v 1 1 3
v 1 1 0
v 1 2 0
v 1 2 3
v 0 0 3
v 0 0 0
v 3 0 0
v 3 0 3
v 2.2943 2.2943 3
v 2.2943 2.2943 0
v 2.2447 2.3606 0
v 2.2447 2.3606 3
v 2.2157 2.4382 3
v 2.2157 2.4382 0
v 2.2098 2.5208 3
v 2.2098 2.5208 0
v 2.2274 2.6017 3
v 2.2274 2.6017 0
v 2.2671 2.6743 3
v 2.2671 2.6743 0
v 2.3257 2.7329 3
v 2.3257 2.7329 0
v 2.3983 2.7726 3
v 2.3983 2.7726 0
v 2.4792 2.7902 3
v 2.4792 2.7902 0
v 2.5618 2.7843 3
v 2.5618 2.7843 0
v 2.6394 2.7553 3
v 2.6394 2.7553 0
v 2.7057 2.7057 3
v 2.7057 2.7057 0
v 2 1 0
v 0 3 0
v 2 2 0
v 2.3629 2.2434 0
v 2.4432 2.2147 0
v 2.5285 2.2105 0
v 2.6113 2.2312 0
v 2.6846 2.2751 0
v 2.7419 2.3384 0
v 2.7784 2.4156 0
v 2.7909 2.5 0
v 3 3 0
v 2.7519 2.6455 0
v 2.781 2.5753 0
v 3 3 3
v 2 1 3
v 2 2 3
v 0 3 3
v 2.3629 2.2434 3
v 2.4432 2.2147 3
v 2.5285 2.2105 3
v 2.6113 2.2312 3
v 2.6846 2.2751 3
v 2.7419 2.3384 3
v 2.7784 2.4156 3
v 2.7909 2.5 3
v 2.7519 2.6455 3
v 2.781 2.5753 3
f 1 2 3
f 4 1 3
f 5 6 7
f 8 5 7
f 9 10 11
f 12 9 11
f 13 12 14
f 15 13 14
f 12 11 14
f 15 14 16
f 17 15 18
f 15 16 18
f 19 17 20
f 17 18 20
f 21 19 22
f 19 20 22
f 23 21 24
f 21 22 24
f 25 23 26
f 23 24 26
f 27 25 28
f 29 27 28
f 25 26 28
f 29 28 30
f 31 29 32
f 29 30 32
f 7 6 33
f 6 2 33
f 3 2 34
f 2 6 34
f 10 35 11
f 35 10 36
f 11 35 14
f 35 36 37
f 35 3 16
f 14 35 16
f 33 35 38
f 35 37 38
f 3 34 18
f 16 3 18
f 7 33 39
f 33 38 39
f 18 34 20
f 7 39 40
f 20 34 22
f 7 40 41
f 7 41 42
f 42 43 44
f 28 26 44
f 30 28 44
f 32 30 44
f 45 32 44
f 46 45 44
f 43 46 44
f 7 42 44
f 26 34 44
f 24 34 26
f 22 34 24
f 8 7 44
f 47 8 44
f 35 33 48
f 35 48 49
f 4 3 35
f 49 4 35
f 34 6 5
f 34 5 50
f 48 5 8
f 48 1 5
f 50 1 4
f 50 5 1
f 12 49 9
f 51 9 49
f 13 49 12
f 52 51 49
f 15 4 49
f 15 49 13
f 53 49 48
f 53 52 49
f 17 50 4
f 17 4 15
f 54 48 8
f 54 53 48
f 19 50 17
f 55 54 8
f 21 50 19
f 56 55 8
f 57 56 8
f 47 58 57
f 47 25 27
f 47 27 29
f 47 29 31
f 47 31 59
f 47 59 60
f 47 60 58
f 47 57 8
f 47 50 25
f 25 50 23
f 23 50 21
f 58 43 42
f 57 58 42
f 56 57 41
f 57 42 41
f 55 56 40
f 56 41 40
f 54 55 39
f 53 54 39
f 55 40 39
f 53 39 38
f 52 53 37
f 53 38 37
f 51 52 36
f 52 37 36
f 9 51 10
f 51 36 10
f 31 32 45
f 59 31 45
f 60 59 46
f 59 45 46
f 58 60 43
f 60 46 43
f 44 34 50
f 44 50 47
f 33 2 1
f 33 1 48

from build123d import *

# Parameters (mm, degrees)
F0_W     = 3
F0_H     = 3
F0_W_2   = 1
F0_H_2   = 1
F1_DEPTH = 3


with BuildPart() as f1:
    # F0 (on Top) → F1 (new body)
    with BuildSketch(Plane.XY):
        with Locations((1.5, 1.5)):
            Rectangle(F0_W, F0_H)
        with Locations((1.5, 1.5)):
            Rectangle(F0_W_2, F0_H_2, mode=Mode.SUBTRACT)
        with BuildLine():
            ThreePointArc((2.294295, 2.294295), (2.294295, 2.705705), (2.705705, 2.705705))
            ThreePointArc((2.705705, 2.705705), (2.768767, 2.611327), (2.790911, 2.5))
            ThreePointArc((2.790911, 2.5), (2.611327, 2.231233), (2.294295, 2.294295))
        make_face(mode=Mode.SUBTRACT)
    extrude(amount=F1_DEPTH)


solid = f1.part
